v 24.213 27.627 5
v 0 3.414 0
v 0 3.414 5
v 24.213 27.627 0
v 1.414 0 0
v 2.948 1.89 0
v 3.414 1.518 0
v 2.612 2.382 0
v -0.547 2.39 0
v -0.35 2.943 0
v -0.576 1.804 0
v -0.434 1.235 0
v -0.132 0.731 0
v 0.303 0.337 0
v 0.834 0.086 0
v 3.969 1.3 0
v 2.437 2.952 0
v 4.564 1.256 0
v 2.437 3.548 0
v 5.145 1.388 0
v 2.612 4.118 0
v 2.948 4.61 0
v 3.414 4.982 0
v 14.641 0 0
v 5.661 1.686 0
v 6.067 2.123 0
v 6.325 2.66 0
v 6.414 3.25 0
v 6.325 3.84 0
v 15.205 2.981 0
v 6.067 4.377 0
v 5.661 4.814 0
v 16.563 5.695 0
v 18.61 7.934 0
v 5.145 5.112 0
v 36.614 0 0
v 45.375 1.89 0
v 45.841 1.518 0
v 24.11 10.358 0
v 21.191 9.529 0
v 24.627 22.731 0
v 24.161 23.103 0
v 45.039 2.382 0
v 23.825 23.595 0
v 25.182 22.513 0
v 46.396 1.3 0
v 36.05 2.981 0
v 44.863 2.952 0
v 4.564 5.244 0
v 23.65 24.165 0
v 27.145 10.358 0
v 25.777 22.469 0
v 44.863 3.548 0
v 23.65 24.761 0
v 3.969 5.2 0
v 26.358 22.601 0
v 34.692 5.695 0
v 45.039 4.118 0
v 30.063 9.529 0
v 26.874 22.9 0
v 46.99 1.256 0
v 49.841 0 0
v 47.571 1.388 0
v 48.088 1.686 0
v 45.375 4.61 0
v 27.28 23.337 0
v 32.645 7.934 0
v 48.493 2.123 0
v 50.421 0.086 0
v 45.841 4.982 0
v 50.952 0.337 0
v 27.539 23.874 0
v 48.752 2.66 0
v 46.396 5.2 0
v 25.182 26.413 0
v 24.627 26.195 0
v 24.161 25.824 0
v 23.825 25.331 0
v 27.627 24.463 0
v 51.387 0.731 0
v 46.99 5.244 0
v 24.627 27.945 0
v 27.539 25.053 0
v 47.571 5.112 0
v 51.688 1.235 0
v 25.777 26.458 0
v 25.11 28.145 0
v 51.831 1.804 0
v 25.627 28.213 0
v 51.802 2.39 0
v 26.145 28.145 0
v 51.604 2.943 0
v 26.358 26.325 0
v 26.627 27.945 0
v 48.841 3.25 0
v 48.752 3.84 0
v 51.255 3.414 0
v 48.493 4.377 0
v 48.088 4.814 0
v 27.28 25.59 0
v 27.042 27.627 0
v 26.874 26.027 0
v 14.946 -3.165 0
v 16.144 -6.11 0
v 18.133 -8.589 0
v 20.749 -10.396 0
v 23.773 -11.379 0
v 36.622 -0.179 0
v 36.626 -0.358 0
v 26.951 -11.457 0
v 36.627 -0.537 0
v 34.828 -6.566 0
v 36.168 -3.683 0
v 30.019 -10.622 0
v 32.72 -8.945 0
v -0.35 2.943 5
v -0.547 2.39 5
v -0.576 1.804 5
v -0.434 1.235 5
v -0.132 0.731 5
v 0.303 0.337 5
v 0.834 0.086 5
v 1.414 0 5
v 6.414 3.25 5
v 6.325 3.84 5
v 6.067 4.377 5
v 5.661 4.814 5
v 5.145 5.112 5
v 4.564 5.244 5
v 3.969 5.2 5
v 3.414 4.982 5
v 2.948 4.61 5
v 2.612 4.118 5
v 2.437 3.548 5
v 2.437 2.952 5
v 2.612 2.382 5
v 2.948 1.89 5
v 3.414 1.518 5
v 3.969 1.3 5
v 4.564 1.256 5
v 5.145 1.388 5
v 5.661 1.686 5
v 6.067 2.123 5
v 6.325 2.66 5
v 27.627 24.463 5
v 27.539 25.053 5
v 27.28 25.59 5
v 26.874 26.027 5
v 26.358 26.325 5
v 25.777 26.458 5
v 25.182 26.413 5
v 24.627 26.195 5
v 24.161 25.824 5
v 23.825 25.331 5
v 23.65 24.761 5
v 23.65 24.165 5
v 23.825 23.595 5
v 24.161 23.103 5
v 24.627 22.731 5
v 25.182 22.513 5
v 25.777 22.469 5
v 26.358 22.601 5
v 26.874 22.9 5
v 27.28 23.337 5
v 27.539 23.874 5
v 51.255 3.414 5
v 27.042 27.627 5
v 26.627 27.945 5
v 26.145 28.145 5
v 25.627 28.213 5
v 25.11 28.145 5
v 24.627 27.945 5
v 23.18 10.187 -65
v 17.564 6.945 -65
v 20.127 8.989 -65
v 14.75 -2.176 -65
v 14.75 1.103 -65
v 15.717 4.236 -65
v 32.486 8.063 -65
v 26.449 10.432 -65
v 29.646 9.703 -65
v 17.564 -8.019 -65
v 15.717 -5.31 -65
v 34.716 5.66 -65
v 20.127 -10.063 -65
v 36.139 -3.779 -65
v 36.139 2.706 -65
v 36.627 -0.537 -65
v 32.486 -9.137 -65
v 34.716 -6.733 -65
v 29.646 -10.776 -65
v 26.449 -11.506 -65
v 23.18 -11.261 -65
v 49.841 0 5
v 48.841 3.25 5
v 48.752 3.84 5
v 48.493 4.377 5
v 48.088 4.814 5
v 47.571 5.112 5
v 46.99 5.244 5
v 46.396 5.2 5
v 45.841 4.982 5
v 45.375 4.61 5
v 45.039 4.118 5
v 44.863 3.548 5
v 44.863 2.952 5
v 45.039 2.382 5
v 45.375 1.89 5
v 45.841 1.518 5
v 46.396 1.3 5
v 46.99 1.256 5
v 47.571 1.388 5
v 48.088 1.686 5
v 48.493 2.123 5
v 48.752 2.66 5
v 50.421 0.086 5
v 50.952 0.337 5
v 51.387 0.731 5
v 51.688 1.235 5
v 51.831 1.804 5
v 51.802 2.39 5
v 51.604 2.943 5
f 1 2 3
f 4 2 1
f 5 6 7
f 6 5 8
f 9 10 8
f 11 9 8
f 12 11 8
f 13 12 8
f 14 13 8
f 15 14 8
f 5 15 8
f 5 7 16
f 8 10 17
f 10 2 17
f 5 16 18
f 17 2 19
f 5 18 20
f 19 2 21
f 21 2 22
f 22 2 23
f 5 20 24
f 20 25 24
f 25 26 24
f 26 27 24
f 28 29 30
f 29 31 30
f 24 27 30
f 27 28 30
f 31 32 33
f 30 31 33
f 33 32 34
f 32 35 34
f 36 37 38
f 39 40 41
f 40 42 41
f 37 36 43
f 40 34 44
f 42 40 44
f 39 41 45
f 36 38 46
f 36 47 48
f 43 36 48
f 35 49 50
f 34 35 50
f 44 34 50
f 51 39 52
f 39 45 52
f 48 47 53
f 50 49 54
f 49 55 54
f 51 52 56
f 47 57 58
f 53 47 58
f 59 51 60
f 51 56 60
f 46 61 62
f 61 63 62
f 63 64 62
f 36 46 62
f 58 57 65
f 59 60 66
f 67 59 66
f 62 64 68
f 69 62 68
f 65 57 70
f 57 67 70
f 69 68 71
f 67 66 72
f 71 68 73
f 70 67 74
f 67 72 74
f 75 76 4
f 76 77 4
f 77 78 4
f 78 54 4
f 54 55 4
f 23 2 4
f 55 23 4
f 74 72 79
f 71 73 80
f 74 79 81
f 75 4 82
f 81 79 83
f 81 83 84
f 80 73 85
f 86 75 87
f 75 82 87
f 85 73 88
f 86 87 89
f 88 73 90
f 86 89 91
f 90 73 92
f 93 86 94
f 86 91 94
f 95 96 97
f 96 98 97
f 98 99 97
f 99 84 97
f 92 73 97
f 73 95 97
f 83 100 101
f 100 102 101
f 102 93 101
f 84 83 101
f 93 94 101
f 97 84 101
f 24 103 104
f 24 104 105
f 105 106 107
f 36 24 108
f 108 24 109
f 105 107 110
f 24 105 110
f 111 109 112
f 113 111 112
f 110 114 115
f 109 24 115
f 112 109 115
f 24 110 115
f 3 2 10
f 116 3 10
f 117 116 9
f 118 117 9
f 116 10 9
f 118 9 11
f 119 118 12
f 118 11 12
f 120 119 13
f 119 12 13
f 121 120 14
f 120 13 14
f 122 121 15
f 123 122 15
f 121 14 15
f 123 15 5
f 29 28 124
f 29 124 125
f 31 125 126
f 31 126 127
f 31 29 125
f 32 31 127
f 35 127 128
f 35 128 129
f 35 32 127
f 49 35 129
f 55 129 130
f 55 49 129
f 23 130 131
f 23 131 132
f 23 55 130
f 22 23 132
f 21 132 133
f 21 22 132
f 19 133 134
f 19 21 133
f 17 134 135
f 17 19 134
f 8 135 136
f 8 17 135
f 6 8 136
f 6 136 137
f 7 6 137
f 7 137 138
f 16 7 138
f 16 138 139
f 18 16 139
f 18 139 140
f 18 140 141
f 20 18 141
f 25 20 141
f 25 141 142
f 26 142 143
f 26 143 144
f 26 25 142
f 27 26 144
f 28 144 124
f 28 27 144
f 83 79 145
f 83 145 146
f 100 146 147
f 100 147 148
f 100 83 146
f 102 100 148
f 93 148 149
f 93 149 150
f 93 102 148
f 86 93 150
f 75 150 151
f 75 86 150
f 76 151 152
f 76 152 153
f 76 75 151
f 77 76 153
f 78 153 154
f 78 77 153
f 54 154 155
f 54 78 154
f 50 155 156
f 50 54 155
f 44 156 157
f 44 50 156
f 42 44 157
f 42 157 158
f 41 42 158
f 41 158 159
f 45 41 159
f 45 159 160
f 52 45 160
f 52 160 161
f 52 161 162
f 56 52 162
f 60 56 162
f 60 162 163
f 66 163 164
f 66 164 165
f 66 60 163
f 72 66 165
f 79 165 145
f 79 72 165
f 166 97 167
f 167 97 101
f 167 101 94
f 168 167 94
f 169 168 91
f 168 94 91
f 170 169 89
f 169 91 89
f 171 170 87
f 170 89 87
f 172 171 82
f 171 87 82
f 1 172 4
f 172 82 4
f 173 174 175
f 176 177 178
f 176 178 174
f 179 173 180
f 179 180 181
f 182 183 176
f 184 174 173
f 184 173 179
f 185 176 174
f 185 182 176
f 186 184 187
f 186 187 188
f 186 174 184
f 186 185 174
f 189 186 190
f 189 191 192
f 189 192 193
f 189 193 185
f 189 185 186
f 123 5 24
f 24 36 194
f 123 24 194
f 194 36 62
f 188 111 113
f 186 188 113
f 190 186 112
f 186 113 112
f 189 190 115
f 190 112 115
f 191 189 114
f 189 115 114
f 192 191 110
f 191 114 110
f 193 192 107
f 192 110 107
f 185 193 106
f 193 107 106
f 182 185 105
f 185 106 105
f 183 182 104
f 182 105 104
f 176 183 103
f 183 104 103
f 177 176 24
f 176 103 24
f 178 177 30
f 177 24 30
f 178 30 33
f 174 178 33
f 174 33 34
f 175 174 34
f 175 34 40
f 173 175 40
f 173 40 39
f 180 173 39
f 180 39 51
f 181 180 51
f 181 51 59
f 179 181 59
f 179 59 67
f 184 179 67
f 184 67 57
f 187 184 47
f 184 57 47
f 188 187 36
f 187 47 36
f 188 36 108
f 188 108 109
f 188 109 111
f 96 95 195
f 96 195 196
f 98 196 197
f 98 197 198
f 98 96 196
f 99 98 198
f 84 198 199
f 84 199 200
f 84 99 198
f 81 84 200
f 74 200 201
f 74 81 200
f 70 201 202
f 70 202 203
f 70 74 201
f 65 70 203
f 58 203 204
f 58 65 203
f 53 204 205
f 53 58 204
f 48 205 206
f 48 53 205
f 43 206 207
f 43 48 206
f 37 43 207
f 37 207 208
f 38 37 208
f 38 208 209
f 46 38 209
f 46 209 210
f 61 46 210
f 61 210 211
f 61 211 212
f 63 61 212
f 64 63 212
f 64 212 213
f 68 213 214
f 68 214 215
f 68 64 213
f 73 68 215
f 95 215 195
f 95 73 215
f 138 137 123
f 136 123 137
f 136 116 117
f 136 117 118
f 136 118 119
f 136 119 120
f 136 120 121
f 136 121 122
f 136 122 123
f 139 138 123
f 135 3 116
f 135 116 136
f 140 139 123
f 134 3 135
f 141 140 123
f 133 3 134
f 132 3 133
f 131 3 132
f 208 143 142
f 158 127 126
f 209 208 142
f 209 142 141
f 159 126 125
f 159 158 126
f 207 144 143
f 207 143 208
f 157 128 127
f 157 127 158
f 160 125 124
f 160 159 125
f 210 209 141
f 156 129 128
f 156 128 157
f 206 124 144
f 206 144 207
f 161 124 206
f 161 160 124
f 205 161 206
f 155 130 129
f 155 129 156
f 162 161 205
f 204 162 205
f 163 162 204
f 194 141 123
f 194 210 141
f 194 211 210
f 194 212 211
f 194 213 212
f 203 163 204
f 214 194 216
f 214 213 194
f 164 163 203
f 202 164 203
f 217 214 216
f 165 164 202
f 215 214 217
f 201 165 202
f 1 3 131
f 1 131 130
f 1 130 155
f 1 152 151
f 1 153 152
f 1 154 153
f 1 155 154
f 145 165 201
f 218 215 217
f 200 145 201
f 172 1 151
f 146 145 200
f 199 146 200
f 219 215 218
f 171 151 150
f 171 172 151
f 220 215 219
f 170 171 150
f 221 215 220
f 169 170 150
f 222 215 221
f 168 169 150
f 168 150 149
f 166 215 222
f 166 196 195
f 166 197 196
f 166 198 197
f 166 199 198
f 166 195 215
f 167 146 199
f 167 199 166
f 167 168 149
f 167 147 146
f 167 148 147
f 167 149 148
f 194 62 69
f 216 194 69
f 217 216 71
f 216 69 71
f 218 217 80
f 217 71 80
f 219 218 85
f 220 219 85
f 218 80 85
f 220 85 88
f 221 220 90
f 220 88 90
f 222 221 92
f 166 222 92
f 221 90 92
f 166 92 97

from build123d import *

# Parameters (mm, degrees)
SKETCH_R     = 2
PAD_DEPTH    = 5
SKETCH001_R  = 11
PAD001_DEPTH = 65


with BuildPart() as part:
    # Sketch → Pad (new body)
    with BuildSketch(Plane.XY):
        with BuildLine():
            Line((1.414214, 0), (49.84062, 0))
            ThreePointArc((49.84062, 0), (51.688379, 1.234633), (51.254834, 3.414214))
            Line((51.254834, 3.414214), (27.041631, 27.627417))
            ThreePointArc((27.041631, 27.627417), (25.627417, 28.213203), (24.213203, 27.627417))
            Line((0, 3.414214), (24.213203, 27.627417))
            ThreePointArc((0, 3.414214), (-0.433546, 1.234633), (1.414214, 0))
        make_face()
        with Locations((4.414214, 3.25)):
            Circle(SKETCH_R, mode=Mode.SUBTRACT)
        with Locations((46.84062, 3.25)):
            Circle(SKETCH_R, mode=Mode.SUBTRACT)
        with Locations((25.627417, 24.463203)):
            Circle(SKETCH_R, mode=Mode.SUBTRACT)
    extrude(amount=PAD_DEPTH)

    # Sketch001 (on Face10 of Pad) → Pad001 (join)
    with BuildSketch(Plane(origin=(0, 0, 0), x_dir=(1, 0, 0), z_dir=(0, 0, -1))):
        with Locations((25.627417, 0.536797)):
            Circle(SKETCH001_R)
    extrude(amount=PAD001_DEPTH)


solid = part.part
